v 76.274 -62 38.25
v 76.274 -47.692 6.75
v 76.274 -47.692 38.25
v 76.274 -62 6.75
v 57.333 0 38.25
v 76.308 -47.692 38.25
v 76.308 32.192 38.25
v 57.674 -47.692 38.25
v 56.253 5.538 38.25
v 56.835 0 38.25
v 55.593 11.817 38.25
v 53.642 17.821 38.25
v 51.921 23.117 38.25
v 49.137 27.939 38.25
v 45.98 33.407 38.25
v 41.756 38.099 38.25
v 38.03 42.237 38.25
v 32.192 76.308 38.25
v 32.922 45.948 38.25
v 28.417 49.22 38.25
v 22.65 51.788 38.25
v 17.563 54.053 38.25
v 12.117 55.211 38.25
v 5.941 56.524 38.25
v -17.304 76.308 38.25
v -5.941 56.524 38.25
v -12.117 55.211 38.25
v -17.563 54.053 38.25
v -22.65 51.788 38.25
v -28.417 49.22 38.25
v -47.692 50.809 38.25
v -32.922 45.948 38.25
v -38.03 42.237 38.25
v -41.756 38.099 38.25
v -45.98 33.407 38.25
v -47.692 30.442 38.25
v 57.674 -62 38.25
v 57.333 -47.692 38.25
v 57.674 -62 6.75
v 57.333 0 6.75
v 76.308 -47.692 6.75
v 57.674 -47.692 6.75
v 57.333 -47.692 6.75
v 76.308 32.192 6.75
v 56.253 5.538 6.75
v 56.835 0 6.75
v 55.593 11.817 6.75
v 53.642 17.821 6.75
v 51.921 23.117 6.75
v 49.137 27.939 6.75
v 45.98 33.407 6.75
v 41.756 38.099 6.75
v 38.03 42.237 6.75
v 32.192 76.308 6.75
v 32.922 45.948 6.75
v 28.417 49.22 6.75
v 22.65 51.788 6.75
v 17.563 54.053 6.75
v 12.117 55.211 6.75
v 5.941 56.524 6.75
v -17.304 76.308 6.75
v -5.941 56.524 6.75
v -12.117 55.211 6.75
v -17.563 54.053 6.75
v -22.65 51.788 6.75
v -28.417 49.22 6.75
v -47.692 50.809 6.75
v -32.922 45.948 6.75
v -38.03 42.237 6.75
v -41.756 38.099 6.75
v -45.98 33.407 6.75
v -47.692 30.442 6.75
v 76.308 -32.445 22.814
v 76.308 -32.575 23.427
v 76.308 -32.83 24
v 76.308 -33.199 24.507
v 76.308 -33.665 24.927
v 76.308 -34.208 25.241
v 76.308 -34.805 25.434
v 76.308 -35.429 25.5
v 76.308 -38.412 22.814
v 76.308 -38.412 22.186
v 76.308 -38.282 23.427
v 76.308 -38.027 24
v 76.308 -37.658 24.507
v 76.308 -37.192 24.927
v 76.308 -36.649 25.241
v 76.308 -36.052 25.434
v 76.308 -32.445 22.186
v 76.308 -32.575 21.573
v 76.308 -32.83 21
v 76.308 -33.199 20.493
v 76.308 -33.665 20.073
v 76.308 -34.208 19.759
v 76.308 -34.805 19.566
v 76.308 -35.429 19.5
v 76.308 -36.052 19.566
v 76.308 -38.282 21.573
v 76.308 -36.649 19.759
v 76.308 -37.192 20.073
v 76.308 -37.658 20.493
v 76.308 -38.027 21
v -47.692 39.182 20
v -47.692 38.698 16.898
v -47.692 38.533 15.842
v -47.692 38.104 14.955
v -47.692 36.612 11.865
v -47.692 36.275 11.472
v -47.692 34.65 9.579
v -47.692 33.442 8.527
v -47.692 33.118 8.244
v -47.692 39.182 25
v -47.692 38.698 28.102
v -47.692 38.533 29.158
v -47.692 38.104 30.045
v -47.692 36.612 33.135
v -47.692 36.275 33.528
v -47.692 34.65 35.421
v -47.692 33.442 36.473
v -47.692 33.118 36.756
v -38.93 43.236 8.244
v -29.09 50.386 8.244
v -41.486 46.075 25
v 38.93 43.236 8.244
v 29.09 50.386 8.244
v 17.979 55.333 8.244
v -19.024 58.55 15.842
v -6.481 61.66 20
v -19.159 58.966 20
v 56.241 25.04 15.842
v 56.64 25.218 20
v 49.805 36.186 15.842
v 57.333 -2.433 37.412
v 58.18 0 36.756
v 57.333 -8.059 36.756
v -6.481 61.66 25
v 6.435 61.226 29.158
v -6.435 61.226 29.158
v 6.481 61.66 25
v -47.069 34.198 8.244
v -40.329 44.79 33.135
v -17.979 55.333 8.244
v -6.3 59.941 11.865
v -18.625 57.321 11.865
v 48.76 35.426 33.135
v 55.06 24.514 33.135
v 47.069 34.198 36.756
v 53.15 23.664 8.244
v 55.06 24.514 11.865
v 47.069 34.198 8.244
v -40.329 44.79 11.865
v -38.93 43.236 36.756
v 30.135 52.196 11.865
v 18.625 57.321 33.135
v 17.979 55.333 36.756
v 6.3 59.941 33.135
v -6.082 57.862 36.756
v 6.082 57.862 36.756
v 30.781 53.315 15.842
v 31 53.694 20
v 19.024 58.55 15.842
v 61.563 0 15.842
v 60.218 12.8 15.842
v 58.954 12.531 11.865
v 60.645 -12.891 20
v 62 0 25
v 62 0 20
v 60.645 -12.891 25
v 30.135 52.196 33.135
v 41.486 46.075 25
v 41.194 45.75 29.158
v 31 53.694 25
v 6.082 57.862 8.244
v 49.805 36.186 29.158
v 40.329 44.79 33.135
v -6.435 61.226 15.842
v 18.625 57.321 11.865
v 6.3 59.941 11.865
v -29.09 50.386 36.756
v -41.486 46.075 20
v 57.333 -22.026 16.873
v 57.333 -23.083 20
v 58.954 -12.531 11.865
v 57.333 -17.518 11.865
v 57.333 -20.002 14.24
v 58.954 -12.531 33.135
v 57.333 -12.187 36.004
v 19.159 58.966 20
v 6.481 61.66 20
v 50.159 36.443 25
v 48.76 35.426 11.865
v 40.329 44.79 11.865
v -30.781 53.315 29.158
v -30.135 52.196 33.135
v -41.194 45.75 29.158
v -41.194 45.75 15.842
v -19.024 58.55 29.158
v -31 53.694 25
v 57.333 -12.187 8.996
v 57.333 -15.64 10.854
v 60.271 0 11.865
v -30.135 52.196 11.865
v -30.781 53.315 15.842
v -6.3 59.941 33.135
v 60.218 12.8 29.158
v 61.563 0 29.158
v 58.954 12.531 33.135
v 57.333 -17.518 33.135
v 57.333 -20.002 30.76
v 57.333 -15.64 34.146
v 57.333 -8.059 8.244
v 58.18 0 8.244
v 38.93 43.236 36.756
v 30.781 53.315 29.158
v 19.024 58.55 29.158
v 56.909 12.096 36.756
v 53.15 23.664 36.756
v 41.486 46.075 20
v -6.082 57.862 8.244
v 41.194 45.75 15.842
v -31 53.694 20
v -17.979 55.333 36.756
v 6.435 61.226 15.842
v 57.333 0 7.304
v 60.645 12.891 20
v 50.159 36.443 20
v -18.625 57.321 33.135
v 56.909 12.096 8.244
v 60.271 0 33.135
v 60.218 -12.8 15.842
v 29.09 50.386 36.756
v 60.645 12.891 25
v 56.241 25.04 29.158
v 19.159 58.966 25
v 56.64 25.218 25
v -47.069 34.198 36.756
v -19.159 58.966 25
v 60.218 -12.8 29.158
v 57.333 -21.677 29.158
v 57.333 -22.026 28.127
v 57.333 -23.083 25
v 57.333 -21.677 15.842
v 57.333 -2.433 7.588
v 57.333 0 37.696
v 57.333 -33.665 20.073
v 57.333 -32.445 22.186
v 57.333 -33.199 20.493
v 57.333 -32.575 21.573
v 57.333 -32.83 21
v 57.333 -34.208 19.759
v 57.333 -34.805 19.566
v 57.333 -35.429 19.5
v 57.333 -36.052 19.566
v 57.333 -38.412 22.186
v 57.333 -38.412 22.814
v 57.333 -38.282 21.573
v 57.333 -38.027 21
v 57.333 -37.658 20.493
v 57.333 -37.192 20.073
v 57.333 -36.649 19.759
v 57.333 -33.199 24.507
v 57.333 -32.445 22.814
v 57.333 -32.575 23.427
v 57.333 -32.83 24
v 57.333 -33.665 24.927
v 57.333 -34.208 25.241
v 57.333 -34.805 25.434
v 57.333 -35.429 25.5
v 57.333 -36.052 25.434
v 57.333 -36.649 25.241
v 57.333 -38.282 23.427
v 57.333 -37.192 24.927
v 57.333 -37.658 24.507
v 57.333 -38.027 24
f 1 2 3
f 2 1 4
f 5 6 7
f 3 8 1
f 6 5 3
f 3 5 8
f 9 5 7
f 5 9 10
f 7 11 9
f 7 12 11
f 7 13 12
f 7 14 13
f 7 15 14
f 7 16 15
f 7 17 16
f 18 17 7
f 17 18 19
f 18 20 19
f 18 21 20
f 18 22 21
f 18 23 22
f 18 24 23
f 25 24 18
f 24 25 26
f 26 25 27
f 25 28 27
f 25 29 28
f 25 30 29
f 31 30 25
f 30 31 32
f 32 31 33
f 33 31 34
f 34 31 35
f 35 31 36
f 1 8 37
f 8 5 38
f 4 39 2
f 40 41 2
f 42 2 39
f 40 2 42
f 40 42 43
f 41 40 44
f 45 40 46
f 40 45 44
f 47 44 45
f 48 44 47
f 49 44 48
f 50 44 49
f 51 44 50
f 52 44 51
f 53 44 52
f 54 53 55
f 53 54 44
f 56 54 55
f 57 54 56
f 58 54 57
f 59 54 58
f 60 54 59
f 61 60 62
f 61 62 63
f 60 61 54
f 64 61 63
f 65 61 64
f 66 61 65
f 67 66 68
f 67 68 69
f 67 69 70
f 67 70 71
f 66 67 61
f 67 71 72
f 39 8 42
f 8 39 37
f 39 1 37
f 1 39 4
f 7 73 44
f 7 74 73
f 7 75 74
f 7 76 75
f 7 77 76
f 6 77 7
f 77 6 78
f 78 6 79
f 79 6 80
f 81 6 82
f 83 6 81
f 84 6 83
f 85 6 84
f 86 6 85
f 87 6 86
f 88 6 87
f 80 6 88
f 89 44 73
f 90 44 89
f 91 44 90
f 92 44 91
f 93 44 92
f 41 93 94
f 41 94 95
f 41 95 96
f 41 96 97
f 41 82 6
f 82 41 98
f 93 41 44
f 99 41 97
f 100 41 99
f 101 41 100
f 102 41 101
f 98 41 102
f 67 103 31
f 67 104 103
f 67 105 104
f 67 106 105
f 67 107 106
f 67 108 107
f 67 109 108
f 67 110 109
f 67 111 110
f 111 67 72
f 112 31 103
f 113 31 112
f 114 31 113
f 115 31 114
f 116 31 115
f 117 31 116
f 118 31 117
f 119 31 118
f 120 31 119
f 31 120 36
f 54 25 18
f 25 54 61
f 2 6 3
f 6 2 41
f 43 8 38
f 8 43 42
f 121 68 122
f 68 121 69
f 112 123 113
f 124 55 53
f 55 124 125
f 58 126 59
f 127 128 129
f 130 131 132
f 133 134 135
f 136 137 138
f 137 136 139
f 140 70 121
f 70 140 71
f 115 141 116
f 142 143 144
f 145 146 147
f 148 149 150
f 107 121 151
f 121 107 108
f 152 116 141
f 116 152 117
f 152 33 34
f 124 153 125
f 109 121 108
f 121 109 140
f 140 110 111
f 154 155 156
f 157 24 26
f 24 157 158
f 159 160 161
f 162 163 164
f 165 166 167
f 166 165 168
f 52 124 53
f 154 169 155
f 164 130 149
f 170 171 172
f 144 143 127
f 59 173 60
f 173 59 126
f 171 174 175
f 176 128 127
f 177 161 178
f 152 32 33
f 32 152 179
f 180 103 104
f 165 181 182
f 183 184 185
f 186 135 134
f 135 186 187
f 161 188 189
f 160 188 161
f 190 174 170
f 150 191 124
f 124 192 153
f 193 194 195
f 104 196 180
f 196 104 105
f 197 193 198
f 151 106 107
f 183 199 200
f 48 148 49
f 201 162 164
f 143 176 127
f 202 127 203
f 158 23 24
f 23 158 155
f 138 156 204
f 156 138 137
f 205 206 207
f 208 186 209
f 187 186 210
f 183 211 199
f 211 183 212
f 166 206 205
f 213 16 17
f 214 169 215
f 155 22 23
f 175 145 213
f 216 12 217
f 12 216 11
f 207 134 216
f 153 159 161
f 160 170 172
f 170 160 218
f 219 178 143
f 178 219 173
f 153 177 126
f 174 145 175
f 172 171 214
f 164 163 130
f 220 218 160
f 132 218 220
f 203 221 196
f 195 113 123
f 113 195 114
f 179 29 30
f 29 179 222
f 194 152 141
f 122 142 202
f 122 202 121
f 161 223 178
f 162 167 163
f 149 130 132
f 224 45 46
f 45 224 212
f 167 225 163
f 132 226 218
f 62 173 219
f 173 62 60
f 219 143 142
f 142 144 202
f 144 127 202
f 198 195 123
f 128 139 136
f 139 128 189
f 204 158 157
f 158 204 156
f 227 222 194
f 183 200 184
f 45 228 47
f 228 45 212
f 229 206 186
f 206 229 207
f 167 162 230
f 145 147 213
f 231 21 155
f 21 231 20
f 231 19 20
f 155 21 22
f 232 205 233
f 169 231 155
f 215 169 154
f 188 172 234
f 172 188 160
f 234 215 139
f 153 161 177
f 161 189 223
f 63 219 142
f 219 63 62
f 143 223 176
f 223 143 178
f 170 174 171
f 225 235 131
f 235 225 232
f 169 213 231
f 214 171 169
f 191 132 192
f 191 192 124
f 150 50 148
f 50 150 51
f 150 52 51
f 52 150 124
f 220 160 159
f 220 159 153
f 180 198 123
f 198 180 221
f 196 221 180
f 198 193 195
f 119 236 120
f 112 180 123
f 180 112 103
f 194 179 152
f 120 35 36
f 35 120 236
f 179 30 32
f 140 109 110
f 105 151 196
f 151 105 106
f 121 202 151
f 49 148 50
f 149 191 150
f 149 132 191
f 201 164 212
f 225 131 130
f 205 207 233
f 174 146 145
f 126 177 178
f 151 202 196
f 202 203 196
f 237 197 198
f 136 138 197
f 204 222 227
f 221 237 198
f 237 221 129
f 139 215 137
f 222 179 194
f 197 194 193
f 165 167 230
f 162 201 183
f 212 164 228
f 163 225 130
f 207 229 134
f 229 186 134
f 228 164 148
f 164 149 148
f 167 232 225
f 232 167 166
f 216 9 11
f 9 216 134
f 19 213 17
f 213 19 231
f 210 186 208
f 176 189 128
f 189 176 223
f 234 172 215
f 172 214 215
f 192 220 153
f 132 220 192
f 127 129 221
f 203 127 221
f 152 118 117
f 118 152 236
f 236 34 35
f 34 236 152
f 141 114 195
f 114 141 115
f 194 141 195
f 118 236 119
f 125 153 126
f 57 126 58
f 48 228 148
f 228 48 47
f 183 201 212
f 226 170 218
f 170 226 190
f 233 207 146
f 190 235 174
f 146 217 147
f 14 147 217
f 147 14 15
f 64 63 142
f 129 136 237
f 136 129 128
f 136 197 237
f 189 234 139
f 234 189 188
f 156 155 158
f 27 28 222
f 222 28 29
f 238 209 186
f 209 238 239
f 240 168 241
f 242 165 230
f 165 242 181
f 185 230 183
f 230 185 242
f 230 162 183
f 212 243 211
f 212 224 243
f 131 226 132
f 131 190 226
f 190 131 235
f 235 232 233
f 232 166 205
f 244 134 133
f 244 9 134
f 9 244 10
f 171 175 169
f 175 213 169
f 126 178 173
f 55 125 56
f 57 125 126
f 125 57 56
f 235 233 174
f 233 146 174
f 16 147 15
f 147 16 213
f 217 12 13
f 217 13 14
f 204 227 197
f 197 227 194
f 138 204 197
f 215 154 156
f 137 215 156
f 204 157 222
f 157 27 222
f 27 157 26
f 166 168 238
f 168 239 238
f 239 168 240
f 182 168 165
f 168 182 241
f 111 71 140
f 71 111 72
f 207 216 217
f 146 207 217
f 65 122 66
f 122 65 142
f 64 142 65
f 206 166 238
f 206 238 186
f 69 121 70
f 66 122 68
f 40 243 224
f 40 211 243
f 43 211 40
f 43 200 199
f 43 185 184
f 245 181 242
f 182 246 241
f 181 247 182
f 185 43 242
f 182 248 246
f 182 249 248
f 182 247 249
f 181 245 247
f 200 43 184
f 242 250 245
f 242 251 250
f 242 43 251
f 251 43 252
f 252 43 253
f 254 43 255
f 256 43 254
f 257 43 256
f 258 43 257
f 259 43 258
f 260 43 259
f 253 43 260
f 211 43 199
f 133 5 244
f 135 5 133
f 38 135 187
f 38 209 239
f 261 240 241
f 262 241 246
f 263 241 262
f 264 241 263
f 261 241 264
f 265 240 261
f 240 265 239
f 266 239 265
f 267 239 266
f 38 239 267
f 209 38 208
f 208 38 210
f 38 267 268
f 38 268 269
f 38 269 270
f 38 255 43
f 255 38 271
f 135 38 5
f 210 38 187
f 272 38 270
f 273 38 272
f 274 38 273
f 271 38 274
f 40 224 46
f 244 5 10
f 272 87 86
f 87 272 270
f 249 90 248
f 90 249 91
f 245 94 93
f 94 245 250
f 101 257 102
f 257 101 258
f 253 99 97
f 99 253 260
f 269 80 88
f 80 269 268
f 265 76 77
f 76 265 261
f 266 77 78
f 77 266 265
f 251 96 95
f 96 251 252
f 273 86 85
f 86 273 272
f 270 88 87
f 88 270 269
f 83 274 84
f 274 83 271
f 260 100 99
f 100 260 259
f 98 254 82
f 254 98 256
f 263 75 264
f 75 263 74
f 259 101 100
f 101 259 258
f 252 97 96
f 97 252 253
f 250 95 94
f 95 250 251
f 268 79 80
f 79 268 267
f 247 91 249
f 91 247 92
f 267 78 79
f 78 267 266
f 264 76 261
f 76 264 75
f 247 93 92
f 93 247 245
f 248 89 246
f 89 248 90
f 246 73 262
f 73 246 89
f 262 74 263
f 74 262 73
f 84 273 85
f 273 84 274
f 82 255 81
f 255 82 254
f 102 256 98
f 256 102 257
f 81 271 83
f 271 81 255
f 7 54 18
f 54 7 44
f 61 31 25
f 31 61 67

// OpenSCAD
/*
  RC plane wheel hanger inspired by MLworx
  
  (c) 2017 Janne Mäntyharju
*/

// Diameter of the tire
tire_diameter = 124;

// Tire rounding (radius)
tire_rounding = 20;

// Width of the tire
tire_width = 45;

// Mounting hole diameter
fixing_hole_d = 6;

// ignore variable values
$fn=30;
tire_radius = tire_diameter / 2;
hanger_height = tire_width * 0.7;



// EMBEDDED rcube.scad MODULE

// Rounded primitives for openscad
// (c) 2013 Wouter Robers 

// Syntax example for a rounded block
//translate([-15,0,10]) rcube([20,20,20],2);

// Syntax example for a rounded cylinder
//translate([15,0,10]) rcylinder(r1=15,r2=10,h=20,b=2);

module rcube(Size=[20,20,20],b=2)
{hull(){for(x=[-(Size[0]/2-b),(Size[0]/2-b)]){for(y=[-(Size[1]/2-b),(Size[1]/2-b)]){for(z=[-(Size[2]/2-b),(Size[2]/2-b)]){ translate([x,y,z]) sphere(b);}}}}}


module rcylinder(r1=10,r2=10,h=10,b=2)
{translate([0,0,-h/2]) hull(){rotate_extrude() translate([r1-b,b,0]) circle(r = b); rotate_extrude() translate([r2-b, h-b, 0]) circle(r = b);}}



difference() {
    union() {
      // Upper part        
      translate([tire_radius / 1.075 ,-tire_radius, (tire_width - hanger_height)/2]) cube([tire_radius * 0.3, tire_radius, hanger_height]);
      // Main body
      translate([tire_radius / -1.3,tire_radius / -1.3,(tire_width - hanger_height)/2]) cube([tire_radius*2, tire_radius*2, hanger_height]);
    }
    union() {
      // Tire
      translate([0,0,tire_width/2]) rcylinder(r1=tire_radius, r2=tire_radius, h=tire_width, b=tire_rounding);
      // Trim extras
      translate([tire_radius / -0.93 , -tire_radius, -hanger_height]) cube([tire_radius*2, tire_radius, hanger_height*3]);      
      // Fixing hole
      rotate([0,90,0]) translate([tire_width/-2,-tire_radius/1.75,(tire_width +10 )]) cylinder(r=fixing_hole_d/2, h=tire_radius);
      // lower left
      translate([tire_radius *1.25, tire_radius*0.5, -hanger_height ]) rotate(a=45) cube([tire_radius*2, tire_radius*2, hanger_height*3]);
      // lower right
     translate([tire_radius *-1.15, tire_radius*0.5, -hanger_height ]) rotate(a=40) cube([tire_radius*2, tire_radius*2, hanger_height*3]);
    }
}
